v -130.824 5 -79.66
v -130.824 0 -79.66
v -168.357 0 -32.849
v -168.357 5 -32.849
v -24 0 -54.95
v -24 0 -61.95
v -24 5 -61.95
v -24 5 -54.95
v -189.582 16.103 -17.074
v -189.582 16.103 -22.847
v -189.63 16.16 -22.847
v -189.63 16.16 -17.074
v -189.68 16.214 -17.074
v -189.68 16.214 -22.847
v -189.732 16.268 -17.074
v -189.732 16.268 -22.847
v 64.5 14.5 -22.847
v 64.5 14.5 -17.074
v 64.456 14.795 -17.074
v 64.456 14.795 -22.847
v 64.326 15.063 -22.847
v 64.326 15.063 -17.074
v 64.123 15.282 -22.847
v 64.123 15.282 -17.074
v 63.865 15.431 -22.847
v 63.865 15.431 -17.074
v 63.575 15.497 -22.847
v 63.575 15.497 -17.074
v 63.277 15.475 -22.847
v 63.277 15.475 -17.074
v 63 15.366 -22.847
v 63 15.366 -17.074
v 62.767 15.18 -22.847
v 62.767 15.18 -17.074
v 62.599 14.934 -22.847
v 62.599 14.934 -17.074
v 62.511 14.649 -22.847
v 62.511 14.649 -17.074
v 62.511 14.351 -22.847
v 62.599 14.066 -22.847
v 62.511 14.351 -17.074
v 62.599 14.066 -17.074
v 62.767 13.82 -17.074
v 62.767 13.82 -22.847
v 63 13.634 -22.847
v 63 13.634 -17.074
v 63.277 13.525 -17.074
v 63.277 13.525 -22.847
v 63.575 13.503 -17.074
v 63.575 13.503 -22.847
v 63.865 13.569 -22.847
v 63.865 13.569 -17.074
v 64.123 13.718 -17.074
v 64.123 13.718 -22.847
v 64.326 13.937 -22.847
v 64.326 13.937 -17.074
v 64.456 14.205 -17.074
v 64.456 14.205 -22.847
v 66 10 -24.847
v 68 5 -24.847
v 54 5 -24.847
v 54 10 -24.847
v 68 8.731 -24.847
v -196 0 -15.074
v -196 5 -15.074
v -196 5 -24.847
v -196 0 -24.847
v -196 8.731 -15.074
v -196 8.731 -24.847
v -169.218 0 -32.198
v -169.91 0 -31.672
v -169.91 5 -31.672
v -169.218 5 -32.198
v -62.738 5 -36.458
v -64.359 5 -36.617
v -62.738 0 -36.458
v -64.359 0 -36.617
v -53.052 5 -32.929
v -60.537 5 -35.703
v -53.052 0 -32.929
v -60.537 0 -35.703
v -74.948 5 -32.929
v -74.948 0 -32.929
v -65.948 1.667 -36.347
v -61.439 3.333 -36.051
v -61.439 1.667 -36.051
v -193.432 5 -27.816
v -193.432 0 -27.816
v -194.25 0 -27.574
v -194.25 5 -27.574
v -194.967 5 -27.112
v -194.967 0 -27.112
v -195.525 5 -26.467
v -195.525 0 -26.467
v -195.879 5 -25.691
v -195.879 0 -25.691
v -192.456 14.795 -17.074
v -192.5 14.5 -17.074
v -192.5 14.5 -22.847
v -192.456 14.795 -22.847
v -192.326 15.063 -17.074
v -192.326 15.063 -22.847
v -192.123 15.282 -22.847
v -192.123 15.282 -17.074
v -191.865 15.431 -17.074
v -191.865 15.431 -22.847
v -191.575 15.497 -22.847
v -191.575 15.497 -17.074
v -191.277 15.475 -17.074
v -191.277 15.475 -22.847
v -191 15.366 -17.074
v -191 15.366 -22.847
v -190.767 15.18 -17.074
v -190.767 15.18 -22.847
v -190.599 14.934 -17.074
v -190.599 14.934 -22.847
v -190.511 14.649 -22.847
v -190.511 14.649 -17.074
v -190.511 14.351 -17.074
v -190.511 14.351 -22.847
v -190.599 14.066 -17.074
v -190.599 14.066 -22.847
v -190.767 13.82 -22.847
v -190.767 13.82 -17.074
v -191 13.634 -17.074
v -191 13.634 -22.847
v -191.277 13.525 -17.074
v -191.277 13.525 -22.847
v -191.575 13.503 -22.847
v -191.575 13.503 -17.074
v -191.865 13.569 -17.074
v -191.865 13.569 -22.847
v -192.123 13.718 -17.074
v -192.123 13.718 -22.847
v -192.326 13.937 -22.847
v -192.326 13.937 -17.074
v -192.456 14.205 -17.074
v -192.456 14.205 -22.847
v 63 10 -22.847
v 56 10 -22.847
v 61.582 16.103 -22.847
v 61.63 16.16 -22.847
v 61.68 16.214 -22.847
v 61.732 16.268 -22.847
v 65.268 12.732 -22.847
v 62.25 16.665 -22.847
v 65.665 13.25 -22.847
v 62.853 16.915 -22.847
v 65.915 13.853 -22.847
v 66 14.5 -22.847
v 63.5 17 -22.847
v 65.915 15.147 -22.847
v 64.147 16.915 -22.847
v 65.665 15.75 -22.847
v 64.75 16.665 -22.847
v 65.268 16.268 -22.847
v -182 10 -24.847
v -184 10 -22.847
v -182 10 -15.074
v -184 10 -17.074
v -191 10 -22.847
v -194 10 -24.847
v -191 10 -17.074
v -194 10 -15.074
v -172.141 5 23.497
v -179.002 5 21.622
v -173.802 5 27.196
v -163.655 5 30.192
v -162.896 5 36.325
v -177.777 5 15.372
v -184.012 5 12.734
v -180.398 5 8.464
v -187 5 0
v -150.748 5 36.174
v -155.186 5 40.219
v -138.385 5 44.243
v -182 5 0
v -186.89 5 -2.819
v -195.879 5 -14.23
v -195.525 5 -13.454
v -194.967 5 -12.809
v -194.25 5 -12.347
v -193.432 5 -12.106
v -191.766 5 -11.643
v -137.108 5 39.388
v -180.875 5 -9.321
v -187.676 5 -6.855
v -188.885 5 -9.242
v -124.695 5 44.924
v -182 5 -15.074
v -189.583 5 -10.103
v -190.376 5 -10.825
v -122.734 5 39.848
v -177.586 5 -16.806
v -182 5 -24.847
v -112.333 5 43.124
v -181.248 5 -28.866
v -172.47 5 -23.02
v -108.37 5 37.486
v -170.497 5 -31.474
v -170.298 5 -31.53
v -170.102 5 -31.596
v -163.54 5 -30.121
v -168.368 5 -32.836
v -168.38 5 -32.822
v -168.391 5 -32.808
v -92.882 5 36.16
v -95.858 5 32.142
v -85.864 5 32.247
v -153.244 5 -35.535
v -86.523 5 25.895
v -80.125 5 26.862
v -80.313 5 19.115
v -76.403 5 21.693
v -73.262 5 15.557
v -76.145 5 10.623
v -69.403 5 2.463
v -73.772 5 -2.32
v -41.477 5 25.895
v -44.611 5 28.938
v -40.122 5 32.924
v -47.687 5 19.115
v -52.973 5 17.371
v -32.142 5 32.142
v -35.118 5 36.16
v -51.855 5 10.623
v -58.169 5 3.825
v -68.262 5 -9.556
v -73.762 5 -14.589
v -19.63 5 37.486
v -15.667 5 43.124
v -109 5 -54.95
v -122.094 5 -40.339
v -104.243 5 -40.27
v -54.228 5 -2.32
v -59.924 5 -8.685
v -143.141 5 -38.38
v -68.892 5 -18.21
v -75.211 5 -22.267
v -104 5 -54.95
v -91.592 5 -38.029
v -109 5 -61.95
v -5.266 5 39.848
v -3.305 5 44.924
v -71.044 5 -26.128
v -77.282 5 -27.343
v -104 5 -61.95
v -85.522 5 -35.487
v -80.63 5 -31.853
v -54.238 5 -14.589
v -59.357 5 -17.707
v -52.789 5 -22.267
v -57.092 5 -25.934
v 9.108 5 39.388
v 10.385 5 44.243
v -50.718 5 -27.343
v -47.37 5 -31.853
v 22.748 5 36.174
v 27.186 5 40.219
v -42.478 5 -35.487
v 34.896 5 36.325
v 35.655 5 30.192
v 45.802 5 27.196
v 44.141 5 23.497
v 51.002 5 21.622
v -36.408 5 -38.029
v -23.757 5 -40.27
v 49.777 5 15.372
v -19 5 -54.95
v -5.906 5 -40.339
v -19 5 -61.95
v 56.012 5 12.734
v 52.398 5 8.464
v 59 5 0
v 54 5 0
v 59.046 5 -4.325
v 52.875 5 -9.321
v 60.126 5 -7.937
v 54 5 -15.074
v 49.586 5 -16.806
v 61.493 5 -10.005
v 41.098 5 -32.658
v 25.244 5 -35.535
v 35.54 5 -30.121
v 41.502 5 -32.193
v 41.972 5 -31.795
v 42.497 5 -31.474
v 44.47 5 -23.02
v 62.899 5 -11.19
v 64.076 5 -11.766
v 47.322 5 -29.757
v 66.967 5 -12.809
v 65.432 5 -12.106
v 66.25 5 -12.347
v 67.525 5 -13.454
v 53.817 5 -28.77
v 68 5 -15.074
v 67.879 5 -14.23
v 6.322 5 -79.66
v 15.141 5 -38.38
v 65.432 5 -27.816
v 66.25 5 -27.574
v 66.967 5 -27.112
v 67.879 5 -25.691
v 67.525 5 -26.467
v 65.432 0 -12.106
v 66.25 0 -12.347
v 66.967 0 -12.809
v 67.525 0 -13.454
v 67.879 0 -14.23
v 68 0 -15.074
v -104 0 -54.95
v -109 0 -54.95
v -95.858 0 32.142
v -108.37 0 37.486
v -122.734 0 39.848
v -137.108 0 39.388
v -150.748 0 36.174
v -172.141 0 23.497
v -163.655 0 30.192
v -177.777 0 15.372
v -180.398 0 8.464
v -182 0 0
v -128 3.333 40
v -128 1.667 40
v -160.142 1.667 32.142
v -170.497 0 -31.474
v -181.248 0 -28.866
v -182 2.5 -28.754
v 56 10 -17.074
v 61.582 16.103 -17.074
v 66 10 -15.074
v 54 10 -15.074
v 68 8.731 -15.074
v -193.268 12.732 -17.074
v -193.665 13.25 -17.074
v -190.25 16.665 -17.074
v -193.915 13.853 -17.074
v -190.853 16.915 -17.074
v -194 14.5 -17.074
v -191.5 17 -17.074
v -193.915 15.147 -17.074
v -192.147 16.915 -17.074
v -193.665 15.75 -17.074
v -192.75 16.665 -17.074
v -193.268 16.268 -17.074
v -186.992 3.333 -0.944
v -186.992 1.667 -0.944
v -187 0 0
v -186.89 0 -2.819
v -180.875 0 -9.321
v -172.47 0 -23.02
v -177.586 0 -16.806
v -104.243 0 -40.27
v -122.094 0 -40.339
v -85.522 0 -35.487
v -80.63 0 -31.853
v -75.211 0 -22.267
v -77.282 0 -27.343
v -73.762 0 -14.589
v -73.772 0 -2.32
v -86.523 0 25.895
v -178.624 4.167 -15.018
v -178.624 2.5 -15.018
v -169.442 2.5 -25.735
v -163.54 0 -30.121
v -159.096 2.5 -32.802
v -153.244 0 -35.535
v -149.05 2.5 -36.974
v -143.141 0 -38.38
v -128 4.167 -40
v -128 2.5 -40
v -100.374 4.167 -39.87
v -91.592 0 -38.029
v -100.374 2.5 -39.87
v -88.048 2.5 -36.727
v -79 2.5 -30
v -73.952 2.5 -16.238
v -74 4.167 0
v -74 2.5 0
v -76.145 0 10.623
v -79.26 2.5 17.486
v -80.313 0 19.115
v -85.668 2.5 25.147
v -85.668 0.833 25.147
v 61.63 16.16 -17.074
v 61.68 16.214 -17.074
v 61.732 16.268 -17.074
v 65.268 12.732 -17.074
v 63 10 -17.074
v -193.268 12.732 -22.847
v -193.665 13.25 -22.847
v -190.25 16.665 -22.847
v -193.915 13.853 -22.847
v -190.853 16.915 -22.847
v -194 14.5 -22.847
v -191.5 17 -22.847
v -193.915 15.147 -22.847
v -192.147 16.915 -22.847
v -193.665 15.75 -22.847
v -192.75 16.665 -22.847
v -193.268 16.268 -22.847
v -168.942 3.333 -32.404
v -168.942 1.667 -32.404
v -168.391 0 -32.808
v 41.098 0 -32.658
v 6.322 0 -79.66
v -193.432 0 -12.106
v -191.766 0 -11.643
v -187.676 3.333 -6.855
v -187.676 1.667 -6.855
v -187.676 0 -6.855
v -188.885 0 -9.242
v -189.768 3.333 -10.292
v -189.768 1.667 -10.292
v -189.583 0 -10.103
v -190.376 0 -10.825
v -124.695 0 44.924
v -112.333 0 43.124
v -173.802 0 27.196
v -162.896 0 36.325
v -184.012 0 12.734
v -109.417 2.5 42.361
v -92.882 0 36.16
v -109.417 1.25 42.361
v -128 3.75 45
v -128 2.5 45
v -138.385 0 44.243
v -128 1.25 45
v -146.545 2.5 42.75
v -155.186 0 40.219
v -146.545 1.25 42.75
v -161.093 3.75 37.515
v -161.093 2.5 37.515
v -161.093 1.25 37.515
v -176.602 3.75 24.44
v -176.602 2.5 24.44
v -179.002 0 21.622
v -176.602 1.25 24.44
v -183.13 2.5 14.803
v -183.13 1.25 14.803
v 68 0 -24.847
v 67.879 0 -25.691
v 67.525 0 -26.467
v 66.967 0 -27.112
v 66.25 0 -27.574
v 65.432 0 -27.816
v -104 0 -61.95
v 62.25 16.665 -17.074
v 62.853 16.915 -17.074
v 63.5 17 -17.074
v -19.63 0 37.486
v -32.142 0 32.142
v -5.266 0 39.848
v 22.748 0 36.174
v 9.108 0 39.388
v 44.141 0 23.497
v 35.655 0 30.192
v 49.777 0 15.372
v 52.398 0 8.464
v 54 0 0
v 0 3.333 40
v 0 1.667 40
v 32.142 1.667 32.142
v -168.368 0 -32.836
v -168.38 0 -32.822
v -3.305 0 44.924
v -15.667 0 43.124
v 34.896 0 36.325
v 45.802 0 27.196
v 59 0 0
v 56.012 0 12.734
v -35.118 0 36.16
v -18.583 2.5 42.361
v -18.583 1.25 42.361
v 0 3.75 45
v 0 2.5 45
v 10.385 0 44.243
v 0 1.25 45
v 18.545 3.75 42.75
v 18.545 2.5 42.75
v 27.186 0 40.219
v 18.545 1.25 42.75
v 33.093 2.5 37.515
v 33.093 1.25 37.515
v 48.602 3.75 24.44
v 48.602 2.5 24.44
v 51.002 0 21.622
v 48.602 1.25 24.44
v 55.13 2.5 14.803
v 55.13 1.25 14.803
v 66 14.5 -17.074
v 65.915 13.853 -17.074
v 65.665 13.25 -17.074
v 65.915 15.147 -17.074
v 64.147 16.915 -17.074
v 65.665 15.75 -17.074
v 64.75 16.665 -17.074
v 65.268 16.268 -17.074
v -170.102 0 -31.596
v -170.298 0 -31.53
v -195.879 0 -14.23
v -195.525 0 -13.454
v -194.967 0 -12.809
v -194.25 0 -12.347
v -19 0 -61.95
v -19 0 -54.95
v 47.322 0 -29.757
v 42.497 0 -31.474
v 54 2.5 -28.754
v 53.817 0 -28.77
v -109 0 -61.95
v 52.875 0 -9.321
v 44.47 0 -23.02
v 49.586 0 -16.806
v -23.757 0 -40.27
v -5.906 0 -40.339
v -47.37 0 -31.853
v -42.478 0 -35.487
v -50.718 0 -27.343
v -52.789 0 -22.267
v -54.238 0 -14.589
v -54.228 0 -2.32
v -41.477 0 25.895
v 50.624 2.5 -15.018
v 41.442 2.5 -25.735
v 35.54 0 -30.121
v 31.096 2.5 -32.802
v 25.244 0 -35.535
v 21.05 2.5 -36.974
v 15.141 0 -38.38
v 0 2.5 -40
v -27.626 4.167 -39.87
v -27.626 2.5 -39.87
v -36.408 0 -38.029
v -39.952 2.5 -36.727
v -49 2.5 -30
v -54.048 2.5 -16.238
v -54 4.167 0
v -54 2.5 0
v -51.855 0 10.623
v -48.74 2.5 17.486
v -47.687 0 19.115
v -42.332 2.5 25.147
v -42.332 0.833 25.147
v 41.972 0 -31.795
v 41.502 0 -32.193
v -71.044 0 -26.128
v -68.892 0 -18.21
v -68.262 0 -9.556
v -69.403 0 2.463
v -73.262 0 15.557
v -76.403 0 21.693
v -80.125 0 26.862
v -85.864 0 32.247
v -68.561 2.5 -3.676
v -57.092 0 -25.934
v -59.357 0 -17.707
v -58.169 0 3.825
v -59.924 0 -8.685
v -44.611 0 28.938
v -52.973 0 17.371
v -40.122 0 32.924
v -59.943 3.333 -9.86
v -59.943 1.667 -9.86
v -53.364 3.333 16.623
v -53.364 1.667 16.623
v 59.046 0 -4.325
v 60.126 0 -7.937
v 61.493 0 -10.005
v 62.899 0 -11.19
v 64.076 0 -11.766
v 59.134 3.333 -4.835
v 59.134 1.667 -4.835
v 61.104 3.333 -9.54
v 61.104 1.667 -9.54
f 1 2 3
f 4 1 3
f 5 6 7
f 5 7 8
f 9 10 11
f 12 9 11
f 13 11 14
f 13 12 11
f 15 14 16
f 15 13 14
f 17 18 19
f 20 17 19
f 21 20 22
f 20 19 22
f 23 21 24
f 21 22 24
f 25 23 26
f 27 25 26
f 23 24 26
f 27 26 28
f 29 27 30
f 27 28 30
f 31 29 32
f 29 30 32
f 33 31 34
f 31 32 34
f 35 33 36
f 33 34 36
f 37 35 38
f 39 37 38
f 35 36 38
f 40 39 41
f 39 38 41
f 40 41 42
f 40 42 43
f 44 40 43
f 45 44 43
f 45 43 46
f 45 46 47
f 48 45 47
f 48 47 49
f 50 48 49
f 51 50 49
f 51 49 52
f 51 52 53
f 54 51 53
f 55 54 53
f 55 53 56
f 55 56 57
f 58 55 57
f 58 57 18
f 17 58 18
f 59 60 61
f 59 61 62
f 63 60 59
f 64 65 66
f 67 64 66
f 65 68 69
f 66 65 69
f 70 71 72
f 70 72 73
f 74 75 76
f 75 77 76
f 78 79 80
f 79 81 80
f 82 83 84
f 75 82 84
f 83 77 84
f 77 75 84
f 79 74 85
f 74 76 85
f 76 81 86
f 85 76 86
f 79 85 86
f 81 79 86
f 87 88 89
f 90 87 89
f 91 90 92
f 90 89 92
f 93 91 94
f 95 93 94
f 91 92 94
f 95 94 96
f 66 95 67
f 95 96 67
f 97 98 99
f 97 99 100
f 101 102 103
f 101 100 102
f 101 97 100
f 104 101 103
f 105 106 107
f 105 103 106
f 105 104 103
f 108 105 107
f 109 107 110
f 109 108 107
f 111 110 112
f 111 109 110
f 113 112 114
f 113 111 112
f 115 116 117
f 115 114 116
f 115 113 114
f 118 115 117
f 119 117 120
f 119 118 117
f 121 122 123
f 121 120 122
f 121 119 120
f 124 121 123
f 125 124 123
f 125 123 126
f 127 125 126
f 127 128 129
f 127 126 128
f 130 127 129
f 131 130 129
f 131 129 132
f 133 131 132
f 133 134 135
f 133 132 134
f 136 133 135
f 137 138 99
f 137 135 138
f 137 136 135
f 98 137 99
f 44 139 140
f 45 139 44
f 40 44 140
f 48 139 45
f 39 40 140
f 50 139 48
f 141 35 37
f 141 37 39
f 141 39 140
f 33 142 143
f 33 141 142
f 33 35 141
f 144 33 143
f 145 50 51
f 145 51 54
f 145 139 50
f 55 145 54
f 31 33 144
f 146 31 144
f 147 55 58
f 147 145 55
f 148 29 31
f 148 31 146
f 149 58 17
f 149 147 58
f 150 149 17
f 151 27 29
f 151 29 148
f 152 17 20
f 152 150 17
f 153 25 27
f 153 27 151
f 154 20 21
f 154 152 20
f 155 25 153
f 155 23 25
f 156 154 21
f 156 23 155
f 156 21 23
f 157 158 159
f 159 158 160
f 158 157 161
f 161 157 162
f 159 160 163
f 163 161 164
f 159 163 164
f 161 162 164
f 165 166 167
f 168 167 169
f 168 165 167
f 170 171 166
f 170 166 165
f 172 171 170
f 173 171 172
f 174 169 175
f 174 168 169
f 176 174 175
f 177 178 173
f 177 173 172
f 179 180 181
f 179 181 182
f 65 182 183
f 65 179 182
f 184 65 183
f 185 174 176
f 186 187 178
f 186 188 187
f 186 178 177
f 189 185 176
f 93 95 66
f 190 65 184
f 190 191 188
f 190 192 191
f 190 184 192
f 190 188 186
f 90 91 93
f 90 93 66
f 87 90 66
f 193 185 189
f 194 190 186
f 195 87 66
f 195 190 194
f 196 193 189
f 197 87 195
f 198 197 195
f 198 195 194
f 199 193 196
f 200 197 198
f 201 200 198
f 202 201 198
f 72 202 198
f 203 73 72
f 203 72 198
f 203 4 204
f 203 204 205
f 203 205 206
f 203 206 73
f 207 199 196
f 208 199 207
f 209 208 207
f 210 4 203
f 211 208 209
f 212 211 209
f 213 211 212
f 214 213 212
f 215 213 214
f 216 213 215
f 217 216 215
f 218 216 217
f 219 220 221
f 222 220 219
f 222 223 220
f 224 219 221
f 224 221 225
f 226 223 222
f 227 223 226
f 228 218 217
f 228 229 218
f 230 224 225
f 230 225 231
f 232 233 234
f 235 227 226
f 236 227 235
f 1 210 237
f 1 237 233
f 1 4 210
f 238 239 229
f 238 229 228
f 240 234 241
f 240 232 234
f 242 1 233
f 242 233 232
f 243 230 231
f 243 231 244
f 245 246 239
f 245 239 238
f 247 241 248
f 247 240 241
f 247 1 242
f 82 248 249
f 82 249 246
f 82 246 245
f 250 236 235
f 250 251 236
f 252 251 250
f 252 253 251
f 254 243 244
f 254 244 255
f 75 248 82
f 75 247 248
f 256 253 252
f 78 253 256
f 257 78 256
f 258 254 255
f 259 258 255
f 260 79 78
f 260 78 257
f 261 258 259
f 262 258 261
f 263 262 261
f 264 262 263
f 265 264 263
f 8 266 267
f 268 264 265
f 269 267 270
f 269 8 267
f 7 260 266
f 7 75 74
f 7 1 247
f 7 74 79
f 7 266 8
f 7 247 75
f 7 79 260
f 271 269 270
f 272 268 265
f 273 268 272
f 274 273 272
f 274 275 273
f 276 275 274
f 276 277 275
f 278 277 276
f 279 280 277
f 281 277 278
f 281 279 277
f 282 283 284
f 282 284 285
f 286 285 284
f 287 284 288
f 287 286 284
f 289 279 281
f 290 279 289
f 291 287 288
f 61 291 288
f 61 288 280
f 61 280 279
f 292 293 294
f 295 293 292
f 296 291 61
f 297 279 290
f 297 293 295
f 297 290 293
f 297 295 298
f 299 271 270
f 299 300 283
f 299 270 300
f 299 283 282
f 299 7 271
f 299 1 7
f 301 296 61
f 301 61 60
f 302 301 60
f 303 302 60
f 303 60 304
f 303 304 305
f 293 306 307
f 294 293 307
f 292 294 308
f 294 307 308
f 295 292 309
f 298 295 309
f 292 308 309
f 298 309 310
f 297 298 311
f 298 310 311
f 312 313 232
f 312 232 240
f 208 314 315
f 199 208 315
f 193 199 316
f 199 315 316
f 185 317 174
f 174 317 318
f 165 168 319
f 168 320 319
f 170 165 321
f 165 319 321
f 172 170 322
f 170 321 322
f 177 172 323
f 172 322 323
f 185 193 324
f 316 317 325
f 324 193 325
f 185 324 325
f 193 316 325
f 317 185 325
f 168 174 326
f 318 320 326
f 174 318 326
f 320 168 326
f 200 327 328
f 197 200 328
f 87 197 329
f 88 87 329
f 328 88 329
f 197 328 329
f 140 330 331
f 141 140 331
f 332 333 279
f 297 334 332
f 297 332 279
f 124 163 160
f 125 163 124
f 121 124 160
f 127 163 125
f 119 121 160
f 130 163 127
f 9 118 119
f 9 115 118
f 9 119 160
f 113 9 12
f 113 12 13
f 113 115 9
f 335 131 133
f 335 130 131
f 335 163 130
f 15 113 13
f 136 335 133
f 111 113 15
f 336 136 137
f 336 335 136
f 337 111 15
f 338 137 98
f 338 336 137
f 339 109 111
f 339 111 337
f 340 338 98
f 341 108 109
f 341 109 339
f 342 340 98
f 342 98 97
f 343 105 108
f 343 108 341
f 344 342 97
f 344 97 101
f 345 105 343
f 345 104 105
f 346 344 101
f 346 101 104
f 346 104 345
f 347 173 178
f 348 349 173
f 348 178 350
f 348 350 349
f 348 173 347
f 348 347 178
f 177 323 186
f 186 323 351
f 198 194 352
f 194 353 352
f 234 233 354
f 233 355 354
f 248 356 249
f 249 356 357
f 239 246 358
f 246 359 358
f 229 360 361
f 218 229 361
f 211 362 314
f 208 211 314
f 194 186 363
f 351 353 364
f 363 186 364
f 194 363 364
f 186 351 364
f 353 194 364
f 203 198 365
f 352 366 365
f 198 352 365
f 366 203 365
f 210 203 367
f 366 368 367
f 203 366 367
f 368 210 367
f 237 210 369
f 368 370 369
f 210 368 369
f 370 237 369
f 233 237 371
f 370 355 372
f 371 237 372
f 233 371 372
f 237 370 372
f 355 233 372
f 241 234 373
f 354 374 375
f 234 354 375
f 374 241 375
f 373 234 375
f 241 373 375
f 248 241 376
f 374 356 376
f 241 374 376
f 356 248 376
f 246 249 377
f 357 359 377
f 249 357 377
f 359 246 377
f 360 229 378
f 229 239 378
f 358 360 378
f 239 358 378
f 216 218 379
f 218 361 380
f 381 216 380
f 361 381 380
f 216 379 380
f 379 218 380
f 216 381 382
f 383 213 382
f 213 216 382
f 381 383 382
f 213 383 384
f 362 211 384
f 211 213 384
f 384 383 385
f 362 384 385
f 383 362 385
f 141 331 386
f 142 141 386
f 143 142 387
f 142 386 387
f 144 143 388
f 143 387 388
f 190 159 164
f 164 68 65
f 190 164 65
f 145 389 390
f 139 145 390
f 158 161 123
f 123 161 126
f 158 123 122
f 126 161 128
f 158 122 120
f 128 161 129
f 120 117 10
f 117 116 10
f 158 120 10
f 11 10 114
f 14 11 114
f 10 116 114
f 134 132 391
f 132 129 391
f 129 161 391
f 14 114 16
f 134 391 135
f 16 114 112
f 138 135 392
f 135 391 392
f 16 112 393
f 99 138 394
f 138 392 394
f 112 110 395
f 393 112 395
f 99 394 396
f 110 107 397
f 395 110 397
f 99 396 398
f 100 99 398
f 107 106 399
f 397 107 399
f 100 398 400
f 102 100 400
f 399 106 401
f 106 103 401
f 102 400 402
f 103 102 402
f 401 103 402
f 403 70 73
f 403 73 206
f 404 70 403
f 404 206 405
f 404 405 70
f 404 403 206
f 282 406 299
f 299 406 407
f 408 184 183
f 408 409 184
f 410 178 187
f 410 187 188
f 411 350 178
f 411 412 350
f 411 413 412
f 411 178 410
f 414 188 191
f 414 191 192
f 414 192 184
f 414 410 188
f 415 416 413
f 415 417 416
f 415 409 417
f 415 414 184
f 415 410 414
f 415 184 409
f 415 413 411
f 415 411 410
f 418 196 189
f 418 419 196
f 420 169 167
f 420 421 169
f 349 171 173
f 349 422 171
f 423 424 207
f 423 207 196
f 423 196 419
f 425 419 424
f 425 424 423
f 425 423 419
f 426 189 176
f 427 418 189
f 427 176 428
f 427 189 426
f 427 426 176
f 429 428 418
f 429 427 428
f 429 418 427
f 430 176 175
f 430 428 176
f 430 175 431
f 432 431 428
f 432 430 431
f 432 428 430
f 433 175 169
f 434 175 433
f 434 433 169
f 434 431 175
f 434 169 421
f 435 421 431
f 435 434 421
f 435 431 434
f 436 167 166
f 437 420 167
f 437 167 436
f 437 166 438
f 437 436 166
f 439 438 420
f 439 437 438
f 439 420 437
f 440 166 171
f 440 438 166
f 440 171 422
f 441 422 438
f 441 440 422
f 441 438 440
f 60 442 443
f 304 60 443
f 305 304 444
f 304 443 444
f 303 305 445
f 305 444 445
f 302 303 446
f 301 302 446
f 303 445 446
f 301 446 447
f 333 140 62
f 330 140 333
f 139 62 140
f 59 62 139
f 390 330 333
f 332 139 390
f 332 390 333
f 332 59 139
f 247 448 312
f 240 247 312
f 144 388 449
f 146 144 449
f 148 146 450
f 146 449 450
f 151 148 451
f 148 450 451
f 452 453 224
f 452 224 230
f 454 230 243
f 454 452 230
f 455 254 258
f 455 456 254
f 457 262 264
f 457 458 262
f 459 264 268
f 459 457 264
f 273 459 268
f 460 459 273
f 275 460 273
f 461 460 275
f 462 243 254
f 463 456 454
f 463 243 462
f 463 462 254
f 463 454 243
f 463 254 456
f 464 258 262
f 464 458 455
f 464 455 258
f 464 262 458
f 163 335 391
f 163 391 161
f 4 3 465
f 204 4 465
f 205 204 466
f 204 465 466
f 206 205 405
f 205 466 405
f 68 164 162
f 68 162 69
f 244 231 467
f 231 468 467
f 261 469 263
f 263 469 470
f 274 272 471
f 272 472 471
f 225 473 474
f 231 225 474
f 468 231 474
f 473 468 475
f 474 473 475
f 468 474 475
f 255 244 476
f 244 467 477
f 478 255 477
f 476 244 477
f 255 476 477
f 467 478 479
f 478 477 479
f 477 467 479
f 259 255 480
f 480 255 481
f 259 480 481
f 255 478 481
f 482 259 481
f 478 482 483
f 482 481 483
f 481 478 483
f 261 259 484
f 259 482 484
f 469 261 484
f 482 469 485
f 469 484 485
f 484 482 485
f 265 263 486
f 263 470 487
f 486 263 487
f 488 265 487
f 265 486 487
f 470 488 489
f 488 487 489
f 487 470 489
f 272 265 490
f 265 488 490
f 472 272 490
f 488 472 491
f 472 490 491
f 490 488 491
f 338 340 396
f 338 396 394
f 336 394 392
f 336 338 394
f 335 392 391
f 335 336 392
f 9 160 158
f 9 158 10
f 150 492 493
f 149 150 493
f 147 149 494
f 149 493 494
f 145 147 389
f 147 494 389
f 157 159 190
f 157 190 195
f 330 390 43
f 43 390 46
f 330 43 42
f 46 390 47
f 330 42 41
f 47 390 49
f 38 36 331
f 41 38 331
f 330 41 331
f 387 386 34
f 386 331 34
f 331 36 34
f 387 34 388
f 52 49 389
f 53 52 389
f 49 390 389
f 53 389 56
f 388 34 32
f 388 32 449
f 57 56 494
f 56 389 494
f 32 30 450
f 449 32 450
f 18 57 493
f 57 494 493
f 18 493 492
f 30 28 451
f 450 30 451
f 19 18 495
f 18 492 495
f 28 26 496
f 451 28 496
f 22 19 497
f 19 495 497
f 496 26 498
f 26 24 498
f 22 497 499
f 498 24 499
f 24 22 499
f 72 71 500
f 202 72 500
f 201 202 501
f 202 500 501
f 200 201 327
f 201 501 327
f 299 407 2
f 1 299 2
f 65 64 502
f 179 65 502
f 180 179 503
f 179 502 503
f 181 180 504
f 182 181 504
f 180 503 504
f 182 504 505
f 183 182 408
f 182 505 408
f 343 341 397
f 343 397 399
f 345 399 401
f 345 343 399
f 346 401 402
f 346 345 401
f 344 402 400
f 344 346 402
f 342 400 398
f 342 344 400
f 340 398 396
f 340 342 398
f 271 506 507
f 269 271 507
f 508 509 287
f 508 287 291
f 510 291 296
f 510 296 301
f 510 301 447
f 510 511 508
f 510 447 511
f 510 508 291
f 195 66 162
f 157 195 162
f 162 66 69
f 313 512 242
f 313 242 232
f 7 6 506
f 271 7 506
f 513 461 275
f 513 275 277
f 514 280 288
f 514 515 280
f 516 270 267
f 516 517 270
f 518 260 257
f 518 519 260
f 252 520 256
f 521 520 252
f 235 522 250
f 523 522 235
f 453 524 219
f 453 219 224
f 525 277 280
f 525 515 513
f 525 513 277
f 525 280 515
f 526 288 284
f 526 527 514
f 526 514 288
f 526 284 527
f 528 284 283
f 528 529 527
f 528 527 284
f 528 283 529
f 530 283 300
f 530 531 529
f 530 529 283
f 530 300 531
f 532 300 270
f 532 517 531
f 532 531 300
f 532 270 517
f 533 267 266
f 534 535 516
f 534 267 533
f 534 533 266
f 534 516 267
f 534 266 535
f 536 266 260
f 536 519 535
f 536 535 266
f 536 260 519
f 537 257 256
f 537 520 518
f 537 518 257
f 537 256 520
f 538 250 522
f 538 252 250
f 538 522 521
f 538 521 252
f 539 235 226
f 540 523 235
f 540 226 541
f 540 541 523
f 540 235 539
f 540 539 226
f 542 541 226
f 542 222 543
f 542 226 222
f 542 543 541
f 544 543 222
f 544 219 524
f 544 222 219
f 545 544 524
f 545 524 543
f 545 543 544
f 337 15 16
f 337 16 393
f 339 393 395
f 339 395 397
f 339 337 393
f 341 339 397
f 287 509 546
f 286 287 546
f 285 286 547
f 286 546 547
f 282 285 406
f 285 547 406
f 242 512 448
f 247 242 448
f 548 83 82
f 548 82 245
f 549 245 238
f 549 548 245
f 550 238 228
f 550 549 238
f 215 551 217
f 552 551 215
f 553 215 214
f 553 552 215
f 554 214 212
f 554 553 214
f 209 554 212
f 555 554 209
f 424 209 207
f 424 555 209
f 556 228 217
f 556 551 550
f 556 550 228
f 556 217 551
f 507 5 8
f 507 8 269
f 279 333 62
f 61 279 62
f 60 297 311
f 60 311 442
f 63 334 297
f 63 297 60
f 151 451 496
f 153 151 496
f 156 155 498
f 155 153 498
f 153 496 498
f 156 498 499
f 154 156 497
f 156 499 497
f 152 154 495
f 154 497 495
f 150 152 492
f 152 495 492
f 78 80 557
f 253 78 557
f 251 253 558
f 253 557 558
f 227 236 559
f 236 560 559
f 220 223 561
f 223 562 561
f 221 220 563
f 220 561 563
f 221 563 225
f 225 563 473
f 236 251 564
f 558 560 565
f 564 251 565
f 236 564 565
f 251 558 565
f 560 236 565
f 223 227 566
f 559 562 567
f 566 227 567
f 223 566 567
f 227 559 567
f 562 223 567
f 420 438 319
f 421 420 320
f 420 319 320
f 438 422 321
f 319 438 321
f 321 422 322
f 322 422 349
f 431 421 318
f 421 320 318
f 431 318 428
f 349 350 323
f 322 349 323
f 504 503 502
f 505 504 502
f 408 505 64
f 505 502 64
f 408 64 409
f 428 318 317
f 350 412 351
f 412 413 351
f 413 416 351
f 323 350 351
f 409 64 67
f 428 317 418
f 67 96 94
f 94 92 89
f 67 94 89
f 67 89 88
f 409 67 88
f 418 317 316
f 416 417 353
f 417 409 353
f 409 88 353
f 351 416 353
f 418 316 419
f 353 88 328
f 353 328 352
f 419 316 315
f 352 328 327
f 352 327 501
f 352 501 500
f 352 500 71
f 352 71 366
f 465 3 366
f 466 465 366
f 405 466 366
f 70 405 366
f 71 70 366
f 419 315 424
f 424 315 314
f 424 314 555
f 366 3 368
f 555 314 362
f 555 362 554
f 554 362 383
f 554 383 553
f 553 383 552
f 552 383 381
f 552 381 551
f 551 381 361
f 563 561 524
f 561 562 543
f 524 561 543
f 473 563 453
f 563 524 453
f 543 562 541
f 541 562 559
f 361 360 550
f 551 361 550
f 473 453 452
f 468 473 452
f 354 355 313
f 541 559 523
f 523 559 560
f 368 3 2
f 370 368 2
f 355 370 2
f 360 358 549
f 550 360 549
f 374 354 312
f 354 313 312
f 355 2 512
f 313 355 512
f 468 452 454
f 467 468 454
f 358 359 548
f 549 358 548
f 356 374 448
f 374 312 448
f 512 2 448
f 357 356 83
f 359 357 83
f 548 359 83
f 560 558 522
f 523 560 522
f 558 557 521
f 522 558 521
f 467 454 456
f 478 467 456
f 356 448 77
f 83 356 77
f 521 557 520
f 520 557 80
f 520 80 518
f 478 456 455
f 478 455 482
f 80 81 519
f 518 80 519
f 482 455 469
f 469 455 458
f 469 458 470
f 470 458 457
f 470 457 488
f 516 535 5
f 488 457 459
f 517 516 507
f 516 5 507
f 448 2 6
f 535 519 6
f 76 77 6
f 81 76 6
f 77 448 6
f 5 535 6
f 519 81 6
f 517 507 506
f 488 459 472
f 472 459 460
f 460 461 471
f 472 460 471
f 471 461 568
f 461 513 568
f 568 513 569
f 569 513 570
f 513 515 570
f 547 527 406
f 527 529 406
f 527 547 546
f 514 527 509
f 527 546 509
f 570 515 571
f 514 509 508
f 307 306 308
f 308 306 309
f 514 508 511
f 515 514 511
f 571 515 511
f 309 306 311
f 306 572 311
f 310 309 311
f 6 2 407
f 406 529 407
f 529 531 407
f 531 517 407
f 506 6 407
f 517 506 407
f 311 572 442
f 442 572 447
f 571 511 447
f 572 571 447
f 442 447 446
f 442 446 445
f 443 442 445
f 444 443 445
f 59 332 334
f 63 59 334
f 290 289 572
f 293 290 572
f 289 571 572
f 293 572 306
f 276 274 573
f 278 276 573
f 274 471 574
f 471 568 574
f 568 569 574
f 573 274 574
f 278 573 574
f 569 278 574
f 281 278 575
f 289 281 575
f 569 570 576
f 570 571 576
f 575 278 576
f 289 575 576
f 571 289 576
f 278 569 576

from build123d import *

# Parameters (mm, degrees)
BOSS_EXTRUDE2_DEPTH = 5
BOSS_EXTRUDE3_DEPTH = 7
SKETCH2_4_W         = 5.772435779
SKETCH2_4_H         = 7
BOSS_EXTRUDE4_DEPTH = 5
SKETCH3_R           = 1
CUT_EXTRUDE1_DEPTH  = 208.065878594
SKETCH6_W           = 5
SKETCH6_H           = 7
CUT_EXTRUDE2_DEPTH  = 213.251462741


with BuildPart() as part:
    # Sketch1 → Boss-Extrude2 (new body)
    # profile 1 of 4: a face of its own
    with BuildSketch(Plane(origin=(0, 0, 0), x_dir=(1, 0, 0), z_dir=(0, 1, 0))):
        with BuildLine():
            Line((68, 15.074365775), (68, 24.846801554))
            ThreePointArc((68, 24.846801554), (67.268774739, 26.809621256), (65.431559211, 27.815598726))
            add(Edge.make_bspline(
                [(42.497006951, 31.473771916), (45.841535206, 29.768669785), (53.798896899, 28.492908489), (62.072418833, 28.303900178), (65.431559211, 27.815598726)],
                knots=[0.054561996, 0.054561996, 0.054561996, 0.054561996, 0.473956485, 0.880923623, 0.880923623, 0.880923623, 0.880923623], degree=3))
            ThreePointArc((42.497006951, 31.473771916), (41.728883026, 31.984800317), (41.098270813, 32.658218928))
            Line((41.098270813, 32.658218928), (6.321974116, 79.659797769))
            Line((6.321974116, 79.659797769), (-130.823712763, 79.659797769))
            Line((-130.823712763, 79.659797769), (-168.357434382, 32.849331616))
            ThreePointArc((-168.357434382, 32.849331616), (-168.373978152, 32.828837542), (-168.390656508, 32.808452847))
            ThreePointArc((-168.390656508, 32.808452847), (-169.081796989, 32.148834352), (-169.909644155, 31.67192682))
            add(Edge.make_bspline(
                [(-186.889702979, 2.818515292), (-185.958801053, 13.813191283), (-178.704046411, 24.611644239), (-170.582497362, 31.153016341), (-169.909644155, 31.67192682)],
                knots=[0.01074649, 0.01074649, 0.01074649, 0.01074649, 0.137496661, 0.148923781, 0.148923781, 0.148923781, 0.148923781], degree=3))
            add(Edge.make_bspline(
                [(-187, 0), (-186.877122184, 0.850170327), (-186.834034486, 1.814128347), (-186.889702979, 2.818515292)],
                knots=[0, 0, 0, 0, 0.184082454, 0.184082454, 0.184082454, 0.184082454], degree=3))
            add(Edge.make_bspline(
                [(-92.881574513, -36.160073701), (-103.617442681, -40.871542321), (-124.35902934, -48.786263046), (-158.61212291, -40.484551569), (-172.410552718, -27.76178335), (-184.714807633, -20.619880927), (-187, 0)],
                knots=[0, 0, 0, 0, 0.267825908, 0.508869226, 0.582086635, 1, 1, 1, 1], degree=3))
            add(Edge.make_bspline(
                [(-74.947788511, 32.929092359), (-69.03030208, 25.480038353), (-65.274431542, -1.524862565), (-77.383264734, -29.954640995), (-92.881574513, -36.160073701)],
                knots=[0.639271593, 0.639271593, 0.639271593, 0.639271593, 0.783382198, 1, 1, 1, 1], degree=3))
            add(Edge.make_bspline(
                [(-74.947788511, 32.929092359), (-60.911730061, 38.500342452), (-66.168070855, 37.168029476), (-53.052211489, 32.929092359)],
                knots=[0, 0, 0, 0, 1, 1, 1, 1], degree=3))
            add(Edge.make_bspline(
                [(-53.052211489, 32.929092359), (-67.279339394, 15.019679466), (-58.596650193, -23.548887855), (-35.118425487, -36.160073701)],
                knots=[0.639271593, 0.639271593, 0.639271593, 0.639271593, 1, 1, 1, 1], degree=3))
            add(Edge.make_bspline(
                [(-35.118425487, -36.160073701), (-24.382557319, -40.871542321), (-3.64097066, -48.786263046), (30.61212291, -40.484551569), (44.410552718, -27.76178335), (56.714807633, -20.619880927), (59, 0)],
                knots=[0, 0, 0, 0, 0.267825908, 0.508869226, 0.582086635, 1, 1, 1, 1], degree=3))
            add(Edge.make_bspline(
                [(59, 0), (58.388482892, 4.230980962), (59.753113299, 11.280121294), (65.431559211, 12.105568604)],
                knots=[0, 0, 0, 0, 0.916109789, 0.916109789, 0.916109789, 0.916109789], degree=3))
            ThreePointArc((65.431559211, 12.105568604), (67.268774739, 13.111546073), (68, 15.074365775))
        make_face()
        with BuildLine():
            add(Edge.make_bspline(
                [(-95.857712266, -32.142287734), (-104.471539105, -37.565808336), (-128.714227319, -42.556524389), (-160.976837774, -34.658421894), (-179.899166505, -18.956363211), (-182, 0)],
                knots=[0, 0, 0, 0, 0.331432867, 0.662865733, 1, 1, 1, 1], degree=3))
            add(Edge.make_bspline(
                [(-182, 0), (-182.08200901, 12.107781209), (-175.753339721, 21.324758613), (-153.042034044, 37.943033501), (-127.150989048, 40.566242244), (-74.310738013, 42.327876231), (-72.13772655, -3.841036124), (-79.328025139, -23.238914829), (-95.857712266, -32.142287734)],
                knots=[0, 0, 0, 0, 0.137496661, 0.174732423, 0.372357619, 0.639271593, 0.803593963, 1, 1, 1, 1], degree=3))
        make_face(mode=Mode.SUBTRACT)
        with BuildLine():
            add(Edge.make_bspline(
                [(54, 0), (54.08200901, 12.107781209), (47.753339721, 21.324758613), (25.042034044, 37.943033501), (-0.849010952, 40.566242244), (-53.689261987, 42.327876231), (-55.86227345, -3.841036124), (-48.671974861, -23.238914829), (-32.142287734, -32.142287734)],
                knots=[0, 0, 0, 0, 0.137496661, 0.174732423, 0.372357619, 0.639271593, 0.803593963, 1, 1, 1, 1], degree=3))
            add(Edge.make_bspline(
                [(-32.142287734, -32.142287734), (-23.528460895, -37.565808336), (0.714227319, -42.556524389), (32.976837774, -34.658421894), (51.899166505, -18.956363211), (54, 0)],
                knots=[0, 0, 0, 0, 0.331432867, 0.662865733, 1, 1, 1, 1], degree=3))
        make_face(mode=Mode.SUBTRACT)
    # profile 2 of 4: a face of its own
    with BuildSketch(Plane(origin=(0, 0, 0), x_dir=(1, 0, 0), z_dir=(0, 1, 0))):
        with BuildLine():
            ThreePointArc((-169.909644155, 31.67192682), (-169.081796989, 32.148834352), (-168.390656508, 32.808452847))
            add(Edge.make_bspline(
                [(-169.217617173, 32.197955257), (-168.941807846, 32.404812498), (-168.666165652, 32.608292359), (-168.390656508, 32.808452847)],
                knots=[0.152774068, 0.152774068, 0.152774068, 0.152774068, 0.157456216, 0.157456216, 0.157456216, 0.157456216], degree=3))
            add(Edge.make_bspline(
                [(-169.909644155, 31.67192682), (-169.682542652, 31.847069554), (-169.451805831, 32.022356896), (-169.221114016, 32.195333782), (-169.217617173, 32.197955257)],
                knots=[0.148923781, 0.148923781, 0.148923781, 0.148923781, 0.152780664, 0.152840027, 0.152840027, 0.152840027, 0.152840027], degree=3))
        make_face()
    # profile 3 of 4: a face of its own
    with BuildSketch(Plane(origin=(0, 0, 0), x_dir=(1, 0, 0), z_dir=(0, 1, 0))):
        with BuildLine():
            add(Edge.make_bspline(
                [(-187, 0), (-187.006409675, 0.946322211), (-186.968629324, 1.886333747), (-186.889702979, 2.818515292)],
                knots=[0, 0, 0, 0, 0.01074649, 0.01074649, 0.01074649, 0.01074649], degree=3))
            add(Edge.make_bspline(
                [(-187, 0), (-186.877122184, 0.850170327), (-186.834034486, 1.814128347), (-186.889702979, 2.818515292)],
                knots=[0, 0, 0, 0, 0.184082454, 0.184082454, 0.184082454, 0.184082454], degree=3))
        make_face()
    # profile 4 of 4: a face of its own
    with BuildSketch(Plane(origin=(0, 0, 0), x_dir=(1, 0, 0), z_dir=(0, 1, 0))):
        with BuildLine():
            add(Edge.make_bspline(
                [(-186.889702979, 2.818515292), (-185.958801053, 13.813191283), (-178.704046411, 24.611644239), (-170.582497362, 31.153016341), (-169.909644155, 31.67192682)],
                knots=[0.01074649, 0.01074649, 0.01074649, 0.01074649, 0.137496661, 0.148923781, 0.148923781, 0.148923781, 0.148923781], degree=3))
            ThreePointArc((-169.909644155, 31.67192682), (-170.19948122, 31.56145415), (-170.497006951, 31.473771916))
            add(Edge.make_bspline(
                [(-170.497006951, 31.473771916), (-174.136423388, 30.552962205), (-181.65582182, 28.112382218), (-190.072418833, 28.303900178), (-193.431559211, 27.815598726)],
                knots=[0.054561996, 0.054561996, 0.054561996, 0.054561996, 0.473956485, 0.880923623, 0.880923623, 0.880923623, 0.880923623], degree=3))
            ThreePointArc((-193.431559211, 27.815598726), (-195.268774739, 26.809621256), (-196, 24.846801554))
            Line((-196, 24.846801554), (-196, 15.074365775))
            ThreePointArc((-196, 15.074365775), (-195.268774739, 13.111546073), (-193.431559211, 12.105568604))
            add(Edge.make_bspline(
                [(-186.889702979, 2.818515292), (-187.111075835, 6.812587961), (-188.894136211, 11.445986093), (-193.431559211, 12.105568604)],
                knots=[0.184082454, 0.184082454, 0.184082454, 0.184082454, 0.916109789, 0.916109789, 0.916109789, 0.916109789], degree=3))
        make_face()
    extrude(amount=BOSS_EXTRUDE2_DEPTH)

    # Sketch2 → Boss-Extrude3 (add, symmetric)
    with BuildSketch(Plane(origin=(61, 0, 0), x_dir=(0, 0, -1), z_dir=(1, 0, 0))):
        Polygon((15.074365775, 10), (15.074365775, 5), (24.846801554, 5), (24.846801554, 10), (22.846801554, 10), (17.074365775, 10), align=None)
    boss_extrude3 = extrude(amount=BOSS_EXTRUDE3_DEPTH, both=True)

    # Sketch2<4> → Boss-Extrude4 (add, symmetric)
    with BuildSketch(Plane(origin=(61, 0, 0), x_dir=(0, 0, -1), z_dir=(1, 0, 0))):
        with Locations((19.960583664, 13.5)):
            Rectangle(SKETCH2_4_W, SKETCH2_4_H)
    boss_extrude4 = extrude(amount=BOSS_EXTRUDE4_DEPTH, both=True)

    # Sketch3 → Cut-Extrude1 (cut, through all)
    with BuildSketch(Plane.XY.offset(-15.074365775)):
        Polygon((68, 10), (66, 10), (68, 8.730812567), align=None)
        with BuildLine():
            Line((56, 17), (56, 10))
            Line((56, 10), (61.581791004, 16.103269862))
            ThreePointArc((61.581791004, 16.103269862), (61.655177652, 16.187196048), (61.732233047, 16.267766953))
            ThreePointArc((61.732233047, 16.267766953), (62.543291419, 16.809698831), (63.5, 17))
            Line((63.5, 17), (56, 17))
        make_face()
        with BuildLine():
            ThreePointArc((63.5, 17), (65.267766953, 16.267766953), (66, 14.5))
            Line((66, 14.5), (66, 17))
            Line((66, 17), (63.5, 17))
        make_face()
        with BuildLine():
            Line((63, 10), (66, 10))
            Line((66, 10), (66, 14.5))
            ThreePointArc((66, 14.5), (65.809698831, 13.543291419), (65.267766953, 12.732233047))
            Line((65.267766953, 12.732233047), (63, 10))
        make_face()
        with Locations((63.5, 14.5)):
            Circle(SKETCH3_R)
    cut_extrude1 = extrude(amount=-CUT_EXTRUDE1_DEPTH, mode=Mode.SUBTRACT)

    # Mirror1: Boss-Extrude3, Boss-Extrude4, Cut-Extrude1 across plane
    add(boss_extrude3.mirror(Plane(origin=(-64, 0, 0), x_dir=(0, 0, 1), z_dir=(1, 0, 0))))
    add(boss_extrude4.mirror(Plane(origin=(-64, 0, 0), x_dir=(0, 0, 1), z_dir=(1, 0, 0))))
    add(cut_extrude1.mirror(Plane(origin=(-64, 0, 0), x_dir=(0, 0, 1), z_dir=(1, 0, 0))), mode=Mode.SUBTRACT)

    # Sketch6 → Cut-Extrude2 (cut, through all)
    with BuildSketch(Plane.XZ):
        with Locations((-106.5, -58.449797769)):
            Rectangle(SKETCH6_W, SKETCH6_H)
        with Locations((-21.5, -58.449797769)):
            Rectangle(SKETCH6_W, SKETCH6_H)
    extrude(amount=-CUT_EXTRUDE2_DEPTH, mode=Mode.SUBTRACT)


solid = part.part
